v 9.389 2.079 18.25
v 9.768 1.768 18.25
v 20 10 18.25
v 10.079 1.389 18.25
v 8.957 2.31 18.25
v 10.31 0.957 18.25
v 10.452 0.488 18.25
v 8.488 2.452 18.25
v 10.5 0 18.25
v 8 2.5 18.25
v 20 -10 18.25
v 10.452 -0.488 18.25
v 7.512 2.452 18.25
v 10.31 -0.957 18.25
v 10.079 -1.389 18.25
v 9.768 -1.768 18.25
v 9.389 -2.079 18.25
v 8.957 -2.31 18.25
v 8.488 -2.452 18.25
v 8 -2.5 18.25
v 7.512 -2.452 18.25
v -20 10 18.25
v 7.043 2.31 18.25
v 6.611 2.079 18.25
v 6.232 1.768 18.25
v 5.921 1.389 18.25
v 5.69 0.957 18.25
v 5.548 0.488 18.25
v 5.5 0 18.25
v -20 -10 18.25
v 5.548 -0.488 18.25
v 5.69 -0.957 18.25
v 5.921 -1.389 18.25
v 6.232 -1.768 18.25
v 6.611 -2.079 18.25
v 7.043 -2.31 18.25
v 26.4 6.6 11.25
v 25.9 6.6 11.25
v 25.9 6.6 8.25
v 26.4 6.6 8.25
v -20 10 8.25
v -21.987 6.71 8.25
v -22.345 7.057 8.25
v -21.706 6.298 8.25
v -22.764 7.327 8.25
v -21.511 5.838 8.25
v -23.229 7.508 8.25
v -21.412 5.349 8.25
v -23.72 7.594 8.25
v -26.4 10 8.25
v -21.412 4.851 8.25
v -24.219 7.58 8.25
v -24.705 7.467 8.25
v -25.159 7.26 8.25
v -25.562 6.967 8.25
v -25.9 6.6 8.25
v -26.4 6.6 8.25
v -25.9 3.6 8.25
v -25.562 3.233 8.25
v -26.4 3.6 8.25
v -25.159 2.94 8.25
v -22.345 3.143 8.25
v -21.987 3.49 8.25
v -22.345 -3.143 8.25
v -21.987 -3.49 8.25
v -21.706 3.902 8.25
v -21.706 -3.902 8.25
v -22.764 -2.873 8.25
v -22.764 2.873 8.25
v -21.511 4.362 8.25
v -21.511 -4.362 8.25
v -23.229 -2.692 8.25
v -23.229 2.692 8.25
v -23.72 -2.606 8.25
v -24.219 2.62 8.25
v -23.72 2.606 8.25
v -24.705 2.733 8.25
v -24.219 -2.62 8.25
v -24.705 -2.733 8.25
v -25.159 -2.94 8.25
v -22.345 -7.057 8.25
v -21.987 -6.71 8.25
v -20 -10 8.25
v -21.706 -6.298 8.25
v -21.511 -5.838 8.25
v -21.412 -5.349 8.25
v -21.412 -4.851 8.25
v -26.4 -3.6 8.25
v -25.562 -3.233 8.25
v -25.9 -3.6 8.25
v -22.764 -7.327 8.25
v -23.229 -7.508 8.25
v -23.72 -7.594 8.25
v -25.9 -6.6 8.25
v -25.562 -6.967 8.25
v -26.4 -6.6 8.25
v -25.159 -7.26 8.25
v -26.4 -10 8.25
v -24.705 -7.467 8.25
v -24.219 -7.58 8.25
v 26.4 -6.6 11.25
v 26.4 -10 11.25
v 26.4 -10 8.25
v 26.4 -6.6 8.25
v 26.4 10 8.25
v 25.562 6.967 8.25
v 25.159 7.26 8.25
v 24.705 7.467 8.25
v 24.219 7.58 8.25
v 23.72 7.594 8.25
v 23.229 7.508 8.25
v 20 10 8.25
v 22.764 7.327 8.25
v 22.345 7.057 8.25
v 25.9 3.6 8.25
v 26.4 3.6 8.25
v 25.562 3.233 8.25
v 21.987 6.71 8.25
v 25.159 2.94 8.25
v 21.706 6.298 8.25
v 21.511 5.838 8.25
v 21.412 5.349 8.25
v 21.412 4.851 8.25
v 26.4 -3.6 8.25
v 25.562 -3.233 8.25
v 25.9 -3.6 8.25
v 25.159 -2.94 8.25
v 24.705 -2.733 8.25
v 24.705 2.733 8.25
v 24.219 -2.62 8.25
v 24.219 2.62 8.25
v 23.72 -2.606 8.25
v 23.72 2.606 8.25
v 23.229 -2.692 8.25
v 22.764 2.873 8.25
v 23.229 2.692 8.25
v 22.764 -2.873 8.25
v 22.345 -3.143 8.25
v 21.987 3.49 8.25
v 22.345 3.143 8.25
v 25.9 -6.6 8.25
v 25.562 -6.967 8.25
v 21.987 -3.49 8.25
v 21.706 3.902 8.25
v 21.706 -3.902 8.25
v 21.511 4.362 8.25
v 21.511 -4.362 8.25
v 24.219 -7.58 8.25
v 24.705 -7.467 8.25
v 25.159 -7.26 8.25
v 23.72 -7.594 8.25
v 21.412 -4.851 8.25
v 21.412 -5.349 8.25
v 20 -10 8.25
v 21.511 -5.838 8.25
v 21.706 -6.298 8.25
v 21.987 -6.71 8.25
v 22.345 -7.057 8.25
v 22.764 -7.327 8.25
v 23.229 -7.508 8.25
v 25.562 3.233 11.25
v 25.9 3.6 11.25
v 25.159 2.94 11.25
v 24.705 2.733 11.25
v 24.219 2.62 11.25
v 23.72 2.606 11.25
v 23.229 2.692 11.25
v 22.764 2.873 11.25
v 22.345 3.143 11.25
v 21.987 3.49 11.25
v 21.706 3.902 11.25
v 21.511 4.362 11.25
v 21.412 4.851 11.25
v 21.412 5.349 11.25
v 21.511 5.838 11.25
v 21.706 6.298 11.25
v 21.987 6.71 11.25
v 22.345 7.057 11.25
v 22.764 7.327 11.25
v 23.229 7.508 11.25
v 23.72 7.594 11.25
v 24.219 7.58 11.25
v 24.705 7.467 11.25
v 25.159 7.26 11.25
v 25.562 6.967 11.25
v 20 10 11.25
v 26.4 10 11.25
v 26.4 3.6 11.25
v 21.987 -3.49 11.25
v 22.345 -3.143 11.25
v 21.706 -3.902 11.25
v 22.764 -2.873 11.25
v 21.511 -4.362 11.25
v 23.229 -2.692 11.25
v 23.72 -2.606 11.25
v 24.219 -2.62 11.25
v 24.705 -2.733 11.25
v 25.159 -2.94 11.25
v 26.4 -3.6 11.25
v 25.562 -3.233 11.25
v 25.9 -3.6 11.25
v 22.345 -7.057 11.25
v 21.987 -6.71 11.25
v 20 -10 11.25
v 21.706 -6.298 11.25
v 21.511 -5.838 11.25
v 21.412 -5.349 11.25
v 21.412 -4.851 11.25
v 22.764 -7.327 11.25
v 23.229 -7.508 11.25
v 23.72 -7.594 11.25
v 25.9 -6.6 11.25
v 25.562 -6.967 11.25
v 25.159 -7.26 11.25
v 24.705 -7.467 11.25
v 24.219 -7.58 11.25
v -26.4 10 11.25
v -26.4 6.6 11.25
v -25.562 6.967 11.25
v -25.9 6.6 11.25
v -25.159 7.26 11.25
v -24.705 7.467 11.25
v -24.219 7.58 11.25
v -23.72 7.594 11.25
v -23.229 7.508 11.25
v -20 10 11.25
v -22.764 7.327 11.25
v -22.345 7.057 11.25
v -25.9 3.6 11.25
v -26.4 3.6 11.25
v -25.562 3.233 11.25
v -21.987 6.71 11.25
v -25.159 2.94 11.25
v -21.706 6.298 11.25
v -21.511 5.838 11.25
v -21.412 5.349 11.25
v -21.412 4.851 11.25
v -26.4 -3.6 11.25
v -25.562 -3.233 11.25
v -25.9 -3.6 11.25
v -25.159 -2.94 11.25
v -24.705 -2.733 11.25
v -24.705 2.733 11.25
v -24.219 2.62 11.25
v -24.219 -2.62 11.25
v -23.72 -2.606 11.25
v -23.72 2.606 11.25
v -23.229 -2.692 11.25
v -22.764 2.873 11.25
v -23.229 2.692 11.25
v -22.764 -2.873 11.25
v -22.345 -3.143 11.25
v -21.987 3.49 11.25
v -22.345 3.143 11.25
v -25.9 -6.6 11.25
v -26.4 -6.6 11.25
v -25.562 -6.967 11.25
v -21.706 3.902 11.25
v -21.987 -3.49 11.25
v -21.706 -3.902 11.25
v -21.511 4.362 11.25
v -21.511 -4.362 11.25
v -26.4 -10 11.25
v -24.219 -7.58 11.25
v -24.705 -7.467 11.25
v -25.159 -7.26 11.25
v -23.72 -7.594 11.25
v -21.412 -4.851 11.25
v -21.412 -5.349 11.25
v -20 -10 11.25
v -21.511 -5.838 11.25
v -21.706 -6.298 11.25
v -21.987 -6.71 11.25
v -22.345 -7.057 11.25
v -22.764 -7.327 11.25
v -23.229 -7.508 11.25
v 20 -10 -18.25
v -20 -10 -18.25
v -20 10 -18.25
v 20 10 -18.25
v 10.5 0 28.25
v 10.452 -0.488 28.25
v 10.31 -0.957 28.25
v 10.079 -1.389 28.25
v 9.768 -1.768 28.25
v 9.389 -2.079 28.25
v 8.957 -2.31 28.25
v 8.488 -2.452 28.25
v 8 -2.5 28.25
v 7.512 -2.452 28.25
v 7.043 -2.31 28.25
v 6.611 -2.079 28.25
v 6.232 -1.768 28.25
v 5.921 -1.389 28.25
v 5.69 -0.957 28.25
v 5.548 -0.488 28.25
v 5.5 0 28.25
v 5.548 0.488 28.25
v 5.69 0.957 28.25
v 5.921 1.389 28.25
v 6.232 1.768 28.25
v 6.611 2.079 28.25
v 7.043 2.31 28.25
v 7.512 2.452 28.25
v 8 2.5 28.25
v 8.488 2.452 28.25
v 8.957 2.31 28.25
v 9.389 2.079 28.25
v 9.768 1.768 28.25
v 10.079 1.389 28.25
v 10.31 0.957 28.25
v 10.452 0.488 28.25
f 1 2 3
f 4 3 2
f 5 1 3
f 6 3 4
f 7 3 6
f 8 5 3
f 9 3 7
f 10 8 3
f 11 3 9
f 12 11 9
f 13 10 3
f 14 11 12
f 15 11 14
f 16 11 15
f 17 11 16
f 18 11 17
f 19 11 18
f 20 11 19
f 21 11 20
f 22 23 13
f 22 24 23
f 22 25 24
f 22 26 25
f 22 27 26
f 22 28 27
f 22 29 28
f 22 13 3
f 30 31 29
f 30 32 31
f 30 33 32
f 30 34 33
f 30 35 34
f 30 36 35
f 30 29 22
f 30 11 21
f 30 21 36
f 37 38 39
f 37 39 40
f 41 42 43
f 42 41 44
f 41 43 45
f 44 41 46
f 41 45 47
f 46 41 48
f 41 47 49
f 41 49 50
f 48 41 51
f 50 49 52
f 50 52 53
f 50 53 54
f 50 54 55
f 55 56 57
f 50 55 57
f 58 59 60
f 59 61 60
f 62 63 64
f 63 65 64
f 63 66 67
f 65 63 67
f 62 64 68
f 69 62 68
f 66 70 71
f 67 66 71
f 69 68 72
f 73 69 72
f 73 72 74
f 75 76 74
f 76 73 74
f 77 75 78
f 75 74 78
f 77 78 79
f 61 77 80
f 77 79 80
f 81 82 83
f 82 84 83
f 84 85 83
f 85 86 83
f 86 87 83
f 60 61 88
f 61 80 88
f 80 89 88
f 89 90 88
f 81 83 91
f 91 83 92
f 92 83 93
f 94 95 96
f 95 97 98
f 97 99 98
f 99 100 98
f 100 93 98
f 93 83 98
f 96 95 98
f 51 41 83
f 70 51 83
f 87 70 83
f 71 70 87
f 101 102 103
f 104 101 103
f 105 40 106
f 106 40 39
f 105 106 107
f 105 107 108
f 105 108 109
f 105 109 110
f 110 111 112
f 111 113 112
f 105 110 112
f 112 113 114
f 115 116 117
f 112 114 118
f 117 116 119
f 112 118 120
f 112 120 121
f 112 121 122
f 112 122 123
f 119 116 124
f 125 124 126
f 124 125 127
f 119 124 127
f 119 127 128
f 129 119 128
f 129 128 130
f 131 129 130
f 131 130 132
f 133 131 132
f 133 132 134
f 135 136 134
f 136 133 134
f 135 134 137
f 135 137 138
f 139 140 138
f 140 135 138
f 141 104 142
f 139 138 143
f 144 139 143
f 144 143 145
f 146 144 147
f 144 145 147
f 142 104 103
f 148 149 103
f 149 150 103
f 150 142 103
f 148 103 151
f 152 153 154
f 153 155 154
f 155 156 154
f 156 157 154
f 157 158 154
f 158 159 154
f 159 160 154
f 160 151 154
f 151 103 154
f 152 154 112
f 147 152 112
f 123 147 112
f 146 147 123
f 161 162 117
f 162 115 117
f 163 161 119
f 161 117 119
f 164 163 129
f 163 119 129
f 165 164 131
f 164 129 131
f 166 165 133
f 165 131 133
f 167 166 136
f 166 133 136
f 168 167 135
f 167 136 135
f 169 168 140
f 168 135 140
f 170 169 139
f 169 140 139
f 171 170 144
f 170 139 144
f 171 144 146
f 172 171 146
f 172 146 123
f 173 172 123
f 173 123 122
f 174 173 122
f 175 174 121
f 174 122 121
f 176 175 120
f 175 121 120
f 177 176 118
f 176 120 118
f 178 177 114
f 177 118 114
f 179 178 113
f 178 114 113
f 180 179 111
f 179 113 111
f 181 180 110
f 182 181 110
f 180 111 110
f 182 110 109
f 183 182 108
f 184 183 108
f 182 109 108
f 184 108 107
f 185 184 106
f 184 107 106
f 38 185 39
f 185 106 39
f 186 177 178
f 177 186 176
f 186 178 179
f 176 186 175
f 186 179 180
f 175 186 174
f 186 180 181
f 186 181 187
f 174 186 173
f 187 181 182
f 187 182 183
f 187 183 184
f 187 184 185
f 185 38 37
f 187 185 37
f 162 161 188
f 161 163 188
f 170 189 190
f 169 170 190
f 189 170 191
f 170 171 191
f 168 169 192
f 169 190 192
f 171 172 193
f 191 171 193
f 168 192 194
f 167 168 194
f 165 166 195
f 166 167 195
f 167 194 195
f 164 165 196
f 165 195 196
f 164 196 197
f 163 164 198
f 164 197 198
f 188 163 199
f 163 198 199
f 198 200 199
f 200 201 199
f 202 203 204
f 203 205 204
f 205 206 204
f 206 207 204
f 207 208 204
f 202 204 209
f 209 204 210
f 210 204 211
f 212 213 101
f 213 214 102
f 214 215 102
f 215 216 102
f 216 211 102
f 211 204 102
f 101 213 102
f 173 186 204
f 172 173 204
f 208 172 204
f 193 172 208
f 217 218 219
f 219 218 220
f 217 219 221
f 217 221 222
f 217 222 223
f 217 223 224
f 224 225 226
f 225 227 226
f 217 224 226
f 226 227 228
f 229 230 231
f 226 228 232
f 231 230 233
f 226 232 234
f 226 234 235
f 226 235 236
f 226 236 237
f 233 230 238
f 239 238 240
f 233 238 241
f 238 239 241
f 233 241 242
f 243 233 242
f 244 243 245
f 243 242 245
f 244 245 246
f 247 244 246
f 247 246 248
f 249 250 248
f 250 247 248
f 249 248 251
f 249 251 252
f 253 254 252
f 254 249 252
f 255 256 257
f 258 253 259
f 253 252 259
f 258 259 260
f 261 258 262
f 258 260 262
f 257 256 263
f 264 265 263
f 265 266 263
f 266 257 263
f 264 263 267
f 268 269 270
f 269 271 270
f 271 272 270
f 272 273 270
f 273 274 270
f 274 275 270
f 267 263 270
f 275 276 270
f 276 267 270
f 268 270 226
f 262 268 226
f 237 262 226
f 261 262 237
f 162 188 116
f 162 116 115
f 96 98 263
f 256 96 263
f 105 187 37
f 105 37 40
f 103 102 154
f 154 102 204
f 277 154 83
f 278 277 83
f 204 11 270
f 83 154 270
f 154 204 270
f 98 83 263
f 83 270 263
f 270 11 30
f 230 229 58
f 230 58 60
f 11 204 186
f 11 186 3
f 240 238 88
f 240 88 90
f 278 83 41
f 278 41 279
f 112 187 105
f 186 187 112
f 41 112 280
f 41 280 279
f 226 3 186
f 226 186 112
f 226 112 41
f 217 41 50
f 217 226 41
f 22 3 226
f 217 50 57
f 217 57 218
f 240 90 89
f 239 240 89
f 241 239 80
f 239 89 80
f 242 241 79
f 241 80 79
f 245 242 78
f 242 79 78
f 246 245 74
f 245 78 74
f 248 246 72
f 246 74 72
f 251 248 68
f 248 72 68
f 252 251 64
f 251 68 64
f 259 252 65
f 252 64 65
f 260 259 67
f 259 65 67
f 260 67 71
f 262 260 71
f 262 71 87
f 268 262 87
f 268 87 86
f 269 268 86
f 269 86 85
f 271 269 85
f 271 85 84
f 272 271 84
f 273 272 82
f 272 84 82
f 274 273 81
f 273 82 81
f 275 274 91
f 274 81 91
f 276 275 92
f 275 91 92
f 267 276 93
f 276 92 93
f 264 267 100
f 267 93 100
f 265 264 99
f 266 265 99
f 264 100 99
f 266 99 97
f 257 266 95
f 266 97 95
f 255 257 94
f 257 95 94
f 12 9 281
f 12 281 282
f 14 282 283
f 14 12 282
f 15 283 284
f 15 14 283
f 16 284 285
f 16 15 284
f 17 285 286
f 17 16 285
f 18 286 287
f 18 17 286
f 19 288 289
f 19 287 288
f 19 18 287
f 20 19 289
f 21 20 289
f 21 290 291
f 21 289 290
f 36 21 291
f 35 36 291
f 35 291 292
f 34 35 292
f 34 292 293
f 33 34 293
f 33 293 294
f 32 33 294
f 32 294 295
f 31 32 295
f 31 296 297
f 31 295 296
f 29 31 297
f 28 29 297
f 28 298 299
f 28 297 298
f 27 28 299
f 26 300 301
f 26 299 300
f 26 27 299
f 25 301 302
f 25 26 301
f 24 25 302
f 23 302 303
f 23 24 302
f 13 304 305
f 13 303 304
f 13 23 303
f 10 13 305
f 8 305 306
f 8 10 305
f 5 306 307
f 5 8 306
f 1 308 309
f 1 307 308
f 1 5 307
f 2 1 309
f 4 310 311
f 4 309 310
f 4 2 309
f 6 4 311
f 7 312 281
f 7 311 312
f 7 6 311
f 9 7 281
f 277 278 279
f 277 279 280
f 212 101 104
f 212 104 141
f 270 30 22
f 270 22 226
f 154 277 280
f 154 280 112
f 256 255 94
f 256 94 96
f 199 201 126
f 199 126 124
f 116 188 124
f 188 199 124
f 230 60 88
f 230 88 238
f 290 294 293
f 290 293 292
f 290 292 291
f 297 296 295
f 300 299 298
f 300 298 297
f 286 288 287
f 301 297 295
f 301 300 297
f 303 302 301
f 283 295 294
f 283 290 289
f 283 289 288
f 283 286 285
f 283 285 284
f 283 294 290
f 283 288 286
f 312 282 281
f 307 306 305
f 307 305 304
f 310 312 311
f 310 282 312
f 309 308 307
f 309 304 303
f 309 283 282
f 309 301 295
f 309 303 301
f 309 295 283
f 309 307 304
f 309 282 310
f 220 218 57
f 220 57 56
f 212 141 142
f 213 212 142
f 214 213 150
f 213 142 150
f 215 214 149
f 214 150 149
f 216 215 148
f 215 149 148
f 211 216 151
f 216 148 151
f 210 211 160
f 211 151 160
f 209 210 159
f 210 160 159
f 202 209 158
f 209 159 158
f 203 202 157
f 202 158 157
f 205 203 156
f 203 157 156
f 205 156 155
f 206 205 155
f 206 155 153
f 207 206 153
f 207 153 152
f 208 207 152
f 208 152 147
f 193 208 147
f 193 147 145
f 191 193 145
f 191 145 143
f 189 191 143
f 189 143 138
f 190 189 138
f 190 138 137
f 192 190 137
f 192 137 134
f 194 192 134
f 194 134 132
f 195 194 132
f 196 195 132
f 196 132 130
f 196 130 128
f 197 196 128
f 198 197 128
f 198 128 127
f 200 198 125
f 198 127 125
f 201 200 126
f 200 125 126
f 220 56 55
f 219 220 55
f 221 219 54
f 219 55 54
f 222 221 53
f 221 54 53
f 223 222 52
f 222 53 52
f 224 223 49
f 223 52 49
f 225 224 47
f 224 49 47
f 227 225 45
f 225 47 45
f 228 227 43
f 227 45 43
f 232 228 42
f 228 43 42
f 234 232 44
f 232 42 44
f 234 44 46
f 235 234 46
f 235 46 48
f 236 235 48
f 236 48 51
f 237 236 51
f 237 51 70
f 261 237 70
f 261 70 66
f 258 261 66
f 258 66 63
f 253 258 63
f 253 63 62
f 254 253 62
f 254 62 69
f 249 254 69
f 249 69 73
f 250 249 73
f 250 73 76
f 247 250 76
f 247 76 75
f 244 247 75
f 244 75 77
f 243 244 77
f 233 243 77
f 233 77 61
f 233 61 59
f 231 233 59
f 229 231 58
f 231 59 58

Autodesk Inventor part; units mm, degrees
ref_plane "YZ Plane" through (0, 0, 0) normal (1, 0, 0) x (0, 1, 0)
ref_plane "XZ Plane" through (0, 0, 0) normal (0, 1, 0) x (-1, 0, 0)
ref_plane "XY Plane" through (0, 0, 0) normal (0, 0, 1) x (1, 0, 0)
sketch "草圖1" plane through (0, 0, 0) normal (0, 1, 0) x (-1, 0, 0)
  line L0 (20, -18.25) -> (-20, -18.25)
  line L1 (-20, -18.25) -> (-20, 18.25)
  line L2 (-20, 18.25) -> (20, 18.25)
  line L3 (20, 18.25) -> (20, -18.25)
  line L4 (20, -18.25) -> (-20, 18.25) construction
  line L5 (-20, -18.25) -> (20, 18.25) construction
  line L6 (26.4, 11.25) -> (-26.4, 11.25)
  line L7 (-26.4, 11.25) -> (-26.4, 8.25)
  line L8 (-26.4, 8.25) -> (26.4, 8.25)
  line L9 (26.4, 8.25) -> (26.4, 11.25)
  point P0 (0, 0)
  point P1 (0, 11.25)
  point P2 (0, 18.25)
  dimension "d0" = 40
  dimension "d1" = 36.5
  dimension "d2" = 3
  dimension "d4" = 52.8
  dimension "d5" = 26.5
extrude "擠出1" add sketch "草圖1" along normal mid plane 20
sketch "草圖2" plane through (20, -10, 11.25) normal (0, 0, 1) x (1, 0, 0)
  line L0 (-40, 0) -> (-40, 20) construction
  line L1 (0, 20) -> (-40, 20) construction
  line L2 (0, 20) -> (0, 0) construction
  line L3 (-40, 0) -> (0, 0) construction
  line L4 (-43.9, 4.9) -> (3.9, 4.9) construction
  line L5 (3.9, 4.9) -> (3.9, 15.1) construction
  line L6 (3.9, 15.1) -> (-43.9, 15.1) construction
  line L7 (-43.9, 15.1) -> (-43.9, 4.9) construction
  line L8 (-43.9, 4.9) -> (3.9, 15.1) construction
  line L9 (3.9, 4.9) -> (-43.9, 15.1) construction
  point P0 (-20, 10)
  dimension "d8" = 47.8
  dimension "d9" = 10.2
hole "孔1" at (23.9, 5.1, 11.25) at (23.9, -5.1, 11.25) at (-23.9, -5.1, 11.25) at (-23.9, 5.1, 11.25) direction (0, 0, -1) diameter 5 depth 8 tip angle 118
sketch "草圖3" plane through (20, -10, 11.25) normal (0, 0, 1) x (1, 0, 0)
  circle A0 centre (3.9, 15.1) radius 2.5 construction
  line L0 (3.9, 16.6) -> (13.7017, 16.6)
  line L1 (13.7017, 16.6) -> (13.7017, 13.6)
  line L2 (13.7017, 13.6) -> (3.9, 13.6)
  line L3 (3.9, 13.6) -> (3.9, 16.6)
  point P0 (-20, 10)
  point P1 (6.4, 15.1)
  dimension "d17" = 3
extrude "擠出2" cut sketch "草圖3" against normal blind 20
mirror "鏡射1" about plane through (0, 0, 0) normal (0, 1, 0) of "擠出2"
mirror "鏡射2" about plane through (0, 0, 0) normal (1, 0, 0) of "擠出2", "鏡射1"
sketch "草圖4" plane through (-20, 10, 18.25) normal (0, 0, 1) x (1, 0, 0)
  circle A0 centre (28, -10) radius 2.5
  line L0 (40, 0) -> (40, -20) construction
  line L1 (0, 0) -> (0, -20) projected
  point P0 (20, -10)
  dimension "d20" = 5
  dimension "d25" = 12
extrude "擠出3" add sketch "草圖4" along normal blind 10
properties part number "馬達"
